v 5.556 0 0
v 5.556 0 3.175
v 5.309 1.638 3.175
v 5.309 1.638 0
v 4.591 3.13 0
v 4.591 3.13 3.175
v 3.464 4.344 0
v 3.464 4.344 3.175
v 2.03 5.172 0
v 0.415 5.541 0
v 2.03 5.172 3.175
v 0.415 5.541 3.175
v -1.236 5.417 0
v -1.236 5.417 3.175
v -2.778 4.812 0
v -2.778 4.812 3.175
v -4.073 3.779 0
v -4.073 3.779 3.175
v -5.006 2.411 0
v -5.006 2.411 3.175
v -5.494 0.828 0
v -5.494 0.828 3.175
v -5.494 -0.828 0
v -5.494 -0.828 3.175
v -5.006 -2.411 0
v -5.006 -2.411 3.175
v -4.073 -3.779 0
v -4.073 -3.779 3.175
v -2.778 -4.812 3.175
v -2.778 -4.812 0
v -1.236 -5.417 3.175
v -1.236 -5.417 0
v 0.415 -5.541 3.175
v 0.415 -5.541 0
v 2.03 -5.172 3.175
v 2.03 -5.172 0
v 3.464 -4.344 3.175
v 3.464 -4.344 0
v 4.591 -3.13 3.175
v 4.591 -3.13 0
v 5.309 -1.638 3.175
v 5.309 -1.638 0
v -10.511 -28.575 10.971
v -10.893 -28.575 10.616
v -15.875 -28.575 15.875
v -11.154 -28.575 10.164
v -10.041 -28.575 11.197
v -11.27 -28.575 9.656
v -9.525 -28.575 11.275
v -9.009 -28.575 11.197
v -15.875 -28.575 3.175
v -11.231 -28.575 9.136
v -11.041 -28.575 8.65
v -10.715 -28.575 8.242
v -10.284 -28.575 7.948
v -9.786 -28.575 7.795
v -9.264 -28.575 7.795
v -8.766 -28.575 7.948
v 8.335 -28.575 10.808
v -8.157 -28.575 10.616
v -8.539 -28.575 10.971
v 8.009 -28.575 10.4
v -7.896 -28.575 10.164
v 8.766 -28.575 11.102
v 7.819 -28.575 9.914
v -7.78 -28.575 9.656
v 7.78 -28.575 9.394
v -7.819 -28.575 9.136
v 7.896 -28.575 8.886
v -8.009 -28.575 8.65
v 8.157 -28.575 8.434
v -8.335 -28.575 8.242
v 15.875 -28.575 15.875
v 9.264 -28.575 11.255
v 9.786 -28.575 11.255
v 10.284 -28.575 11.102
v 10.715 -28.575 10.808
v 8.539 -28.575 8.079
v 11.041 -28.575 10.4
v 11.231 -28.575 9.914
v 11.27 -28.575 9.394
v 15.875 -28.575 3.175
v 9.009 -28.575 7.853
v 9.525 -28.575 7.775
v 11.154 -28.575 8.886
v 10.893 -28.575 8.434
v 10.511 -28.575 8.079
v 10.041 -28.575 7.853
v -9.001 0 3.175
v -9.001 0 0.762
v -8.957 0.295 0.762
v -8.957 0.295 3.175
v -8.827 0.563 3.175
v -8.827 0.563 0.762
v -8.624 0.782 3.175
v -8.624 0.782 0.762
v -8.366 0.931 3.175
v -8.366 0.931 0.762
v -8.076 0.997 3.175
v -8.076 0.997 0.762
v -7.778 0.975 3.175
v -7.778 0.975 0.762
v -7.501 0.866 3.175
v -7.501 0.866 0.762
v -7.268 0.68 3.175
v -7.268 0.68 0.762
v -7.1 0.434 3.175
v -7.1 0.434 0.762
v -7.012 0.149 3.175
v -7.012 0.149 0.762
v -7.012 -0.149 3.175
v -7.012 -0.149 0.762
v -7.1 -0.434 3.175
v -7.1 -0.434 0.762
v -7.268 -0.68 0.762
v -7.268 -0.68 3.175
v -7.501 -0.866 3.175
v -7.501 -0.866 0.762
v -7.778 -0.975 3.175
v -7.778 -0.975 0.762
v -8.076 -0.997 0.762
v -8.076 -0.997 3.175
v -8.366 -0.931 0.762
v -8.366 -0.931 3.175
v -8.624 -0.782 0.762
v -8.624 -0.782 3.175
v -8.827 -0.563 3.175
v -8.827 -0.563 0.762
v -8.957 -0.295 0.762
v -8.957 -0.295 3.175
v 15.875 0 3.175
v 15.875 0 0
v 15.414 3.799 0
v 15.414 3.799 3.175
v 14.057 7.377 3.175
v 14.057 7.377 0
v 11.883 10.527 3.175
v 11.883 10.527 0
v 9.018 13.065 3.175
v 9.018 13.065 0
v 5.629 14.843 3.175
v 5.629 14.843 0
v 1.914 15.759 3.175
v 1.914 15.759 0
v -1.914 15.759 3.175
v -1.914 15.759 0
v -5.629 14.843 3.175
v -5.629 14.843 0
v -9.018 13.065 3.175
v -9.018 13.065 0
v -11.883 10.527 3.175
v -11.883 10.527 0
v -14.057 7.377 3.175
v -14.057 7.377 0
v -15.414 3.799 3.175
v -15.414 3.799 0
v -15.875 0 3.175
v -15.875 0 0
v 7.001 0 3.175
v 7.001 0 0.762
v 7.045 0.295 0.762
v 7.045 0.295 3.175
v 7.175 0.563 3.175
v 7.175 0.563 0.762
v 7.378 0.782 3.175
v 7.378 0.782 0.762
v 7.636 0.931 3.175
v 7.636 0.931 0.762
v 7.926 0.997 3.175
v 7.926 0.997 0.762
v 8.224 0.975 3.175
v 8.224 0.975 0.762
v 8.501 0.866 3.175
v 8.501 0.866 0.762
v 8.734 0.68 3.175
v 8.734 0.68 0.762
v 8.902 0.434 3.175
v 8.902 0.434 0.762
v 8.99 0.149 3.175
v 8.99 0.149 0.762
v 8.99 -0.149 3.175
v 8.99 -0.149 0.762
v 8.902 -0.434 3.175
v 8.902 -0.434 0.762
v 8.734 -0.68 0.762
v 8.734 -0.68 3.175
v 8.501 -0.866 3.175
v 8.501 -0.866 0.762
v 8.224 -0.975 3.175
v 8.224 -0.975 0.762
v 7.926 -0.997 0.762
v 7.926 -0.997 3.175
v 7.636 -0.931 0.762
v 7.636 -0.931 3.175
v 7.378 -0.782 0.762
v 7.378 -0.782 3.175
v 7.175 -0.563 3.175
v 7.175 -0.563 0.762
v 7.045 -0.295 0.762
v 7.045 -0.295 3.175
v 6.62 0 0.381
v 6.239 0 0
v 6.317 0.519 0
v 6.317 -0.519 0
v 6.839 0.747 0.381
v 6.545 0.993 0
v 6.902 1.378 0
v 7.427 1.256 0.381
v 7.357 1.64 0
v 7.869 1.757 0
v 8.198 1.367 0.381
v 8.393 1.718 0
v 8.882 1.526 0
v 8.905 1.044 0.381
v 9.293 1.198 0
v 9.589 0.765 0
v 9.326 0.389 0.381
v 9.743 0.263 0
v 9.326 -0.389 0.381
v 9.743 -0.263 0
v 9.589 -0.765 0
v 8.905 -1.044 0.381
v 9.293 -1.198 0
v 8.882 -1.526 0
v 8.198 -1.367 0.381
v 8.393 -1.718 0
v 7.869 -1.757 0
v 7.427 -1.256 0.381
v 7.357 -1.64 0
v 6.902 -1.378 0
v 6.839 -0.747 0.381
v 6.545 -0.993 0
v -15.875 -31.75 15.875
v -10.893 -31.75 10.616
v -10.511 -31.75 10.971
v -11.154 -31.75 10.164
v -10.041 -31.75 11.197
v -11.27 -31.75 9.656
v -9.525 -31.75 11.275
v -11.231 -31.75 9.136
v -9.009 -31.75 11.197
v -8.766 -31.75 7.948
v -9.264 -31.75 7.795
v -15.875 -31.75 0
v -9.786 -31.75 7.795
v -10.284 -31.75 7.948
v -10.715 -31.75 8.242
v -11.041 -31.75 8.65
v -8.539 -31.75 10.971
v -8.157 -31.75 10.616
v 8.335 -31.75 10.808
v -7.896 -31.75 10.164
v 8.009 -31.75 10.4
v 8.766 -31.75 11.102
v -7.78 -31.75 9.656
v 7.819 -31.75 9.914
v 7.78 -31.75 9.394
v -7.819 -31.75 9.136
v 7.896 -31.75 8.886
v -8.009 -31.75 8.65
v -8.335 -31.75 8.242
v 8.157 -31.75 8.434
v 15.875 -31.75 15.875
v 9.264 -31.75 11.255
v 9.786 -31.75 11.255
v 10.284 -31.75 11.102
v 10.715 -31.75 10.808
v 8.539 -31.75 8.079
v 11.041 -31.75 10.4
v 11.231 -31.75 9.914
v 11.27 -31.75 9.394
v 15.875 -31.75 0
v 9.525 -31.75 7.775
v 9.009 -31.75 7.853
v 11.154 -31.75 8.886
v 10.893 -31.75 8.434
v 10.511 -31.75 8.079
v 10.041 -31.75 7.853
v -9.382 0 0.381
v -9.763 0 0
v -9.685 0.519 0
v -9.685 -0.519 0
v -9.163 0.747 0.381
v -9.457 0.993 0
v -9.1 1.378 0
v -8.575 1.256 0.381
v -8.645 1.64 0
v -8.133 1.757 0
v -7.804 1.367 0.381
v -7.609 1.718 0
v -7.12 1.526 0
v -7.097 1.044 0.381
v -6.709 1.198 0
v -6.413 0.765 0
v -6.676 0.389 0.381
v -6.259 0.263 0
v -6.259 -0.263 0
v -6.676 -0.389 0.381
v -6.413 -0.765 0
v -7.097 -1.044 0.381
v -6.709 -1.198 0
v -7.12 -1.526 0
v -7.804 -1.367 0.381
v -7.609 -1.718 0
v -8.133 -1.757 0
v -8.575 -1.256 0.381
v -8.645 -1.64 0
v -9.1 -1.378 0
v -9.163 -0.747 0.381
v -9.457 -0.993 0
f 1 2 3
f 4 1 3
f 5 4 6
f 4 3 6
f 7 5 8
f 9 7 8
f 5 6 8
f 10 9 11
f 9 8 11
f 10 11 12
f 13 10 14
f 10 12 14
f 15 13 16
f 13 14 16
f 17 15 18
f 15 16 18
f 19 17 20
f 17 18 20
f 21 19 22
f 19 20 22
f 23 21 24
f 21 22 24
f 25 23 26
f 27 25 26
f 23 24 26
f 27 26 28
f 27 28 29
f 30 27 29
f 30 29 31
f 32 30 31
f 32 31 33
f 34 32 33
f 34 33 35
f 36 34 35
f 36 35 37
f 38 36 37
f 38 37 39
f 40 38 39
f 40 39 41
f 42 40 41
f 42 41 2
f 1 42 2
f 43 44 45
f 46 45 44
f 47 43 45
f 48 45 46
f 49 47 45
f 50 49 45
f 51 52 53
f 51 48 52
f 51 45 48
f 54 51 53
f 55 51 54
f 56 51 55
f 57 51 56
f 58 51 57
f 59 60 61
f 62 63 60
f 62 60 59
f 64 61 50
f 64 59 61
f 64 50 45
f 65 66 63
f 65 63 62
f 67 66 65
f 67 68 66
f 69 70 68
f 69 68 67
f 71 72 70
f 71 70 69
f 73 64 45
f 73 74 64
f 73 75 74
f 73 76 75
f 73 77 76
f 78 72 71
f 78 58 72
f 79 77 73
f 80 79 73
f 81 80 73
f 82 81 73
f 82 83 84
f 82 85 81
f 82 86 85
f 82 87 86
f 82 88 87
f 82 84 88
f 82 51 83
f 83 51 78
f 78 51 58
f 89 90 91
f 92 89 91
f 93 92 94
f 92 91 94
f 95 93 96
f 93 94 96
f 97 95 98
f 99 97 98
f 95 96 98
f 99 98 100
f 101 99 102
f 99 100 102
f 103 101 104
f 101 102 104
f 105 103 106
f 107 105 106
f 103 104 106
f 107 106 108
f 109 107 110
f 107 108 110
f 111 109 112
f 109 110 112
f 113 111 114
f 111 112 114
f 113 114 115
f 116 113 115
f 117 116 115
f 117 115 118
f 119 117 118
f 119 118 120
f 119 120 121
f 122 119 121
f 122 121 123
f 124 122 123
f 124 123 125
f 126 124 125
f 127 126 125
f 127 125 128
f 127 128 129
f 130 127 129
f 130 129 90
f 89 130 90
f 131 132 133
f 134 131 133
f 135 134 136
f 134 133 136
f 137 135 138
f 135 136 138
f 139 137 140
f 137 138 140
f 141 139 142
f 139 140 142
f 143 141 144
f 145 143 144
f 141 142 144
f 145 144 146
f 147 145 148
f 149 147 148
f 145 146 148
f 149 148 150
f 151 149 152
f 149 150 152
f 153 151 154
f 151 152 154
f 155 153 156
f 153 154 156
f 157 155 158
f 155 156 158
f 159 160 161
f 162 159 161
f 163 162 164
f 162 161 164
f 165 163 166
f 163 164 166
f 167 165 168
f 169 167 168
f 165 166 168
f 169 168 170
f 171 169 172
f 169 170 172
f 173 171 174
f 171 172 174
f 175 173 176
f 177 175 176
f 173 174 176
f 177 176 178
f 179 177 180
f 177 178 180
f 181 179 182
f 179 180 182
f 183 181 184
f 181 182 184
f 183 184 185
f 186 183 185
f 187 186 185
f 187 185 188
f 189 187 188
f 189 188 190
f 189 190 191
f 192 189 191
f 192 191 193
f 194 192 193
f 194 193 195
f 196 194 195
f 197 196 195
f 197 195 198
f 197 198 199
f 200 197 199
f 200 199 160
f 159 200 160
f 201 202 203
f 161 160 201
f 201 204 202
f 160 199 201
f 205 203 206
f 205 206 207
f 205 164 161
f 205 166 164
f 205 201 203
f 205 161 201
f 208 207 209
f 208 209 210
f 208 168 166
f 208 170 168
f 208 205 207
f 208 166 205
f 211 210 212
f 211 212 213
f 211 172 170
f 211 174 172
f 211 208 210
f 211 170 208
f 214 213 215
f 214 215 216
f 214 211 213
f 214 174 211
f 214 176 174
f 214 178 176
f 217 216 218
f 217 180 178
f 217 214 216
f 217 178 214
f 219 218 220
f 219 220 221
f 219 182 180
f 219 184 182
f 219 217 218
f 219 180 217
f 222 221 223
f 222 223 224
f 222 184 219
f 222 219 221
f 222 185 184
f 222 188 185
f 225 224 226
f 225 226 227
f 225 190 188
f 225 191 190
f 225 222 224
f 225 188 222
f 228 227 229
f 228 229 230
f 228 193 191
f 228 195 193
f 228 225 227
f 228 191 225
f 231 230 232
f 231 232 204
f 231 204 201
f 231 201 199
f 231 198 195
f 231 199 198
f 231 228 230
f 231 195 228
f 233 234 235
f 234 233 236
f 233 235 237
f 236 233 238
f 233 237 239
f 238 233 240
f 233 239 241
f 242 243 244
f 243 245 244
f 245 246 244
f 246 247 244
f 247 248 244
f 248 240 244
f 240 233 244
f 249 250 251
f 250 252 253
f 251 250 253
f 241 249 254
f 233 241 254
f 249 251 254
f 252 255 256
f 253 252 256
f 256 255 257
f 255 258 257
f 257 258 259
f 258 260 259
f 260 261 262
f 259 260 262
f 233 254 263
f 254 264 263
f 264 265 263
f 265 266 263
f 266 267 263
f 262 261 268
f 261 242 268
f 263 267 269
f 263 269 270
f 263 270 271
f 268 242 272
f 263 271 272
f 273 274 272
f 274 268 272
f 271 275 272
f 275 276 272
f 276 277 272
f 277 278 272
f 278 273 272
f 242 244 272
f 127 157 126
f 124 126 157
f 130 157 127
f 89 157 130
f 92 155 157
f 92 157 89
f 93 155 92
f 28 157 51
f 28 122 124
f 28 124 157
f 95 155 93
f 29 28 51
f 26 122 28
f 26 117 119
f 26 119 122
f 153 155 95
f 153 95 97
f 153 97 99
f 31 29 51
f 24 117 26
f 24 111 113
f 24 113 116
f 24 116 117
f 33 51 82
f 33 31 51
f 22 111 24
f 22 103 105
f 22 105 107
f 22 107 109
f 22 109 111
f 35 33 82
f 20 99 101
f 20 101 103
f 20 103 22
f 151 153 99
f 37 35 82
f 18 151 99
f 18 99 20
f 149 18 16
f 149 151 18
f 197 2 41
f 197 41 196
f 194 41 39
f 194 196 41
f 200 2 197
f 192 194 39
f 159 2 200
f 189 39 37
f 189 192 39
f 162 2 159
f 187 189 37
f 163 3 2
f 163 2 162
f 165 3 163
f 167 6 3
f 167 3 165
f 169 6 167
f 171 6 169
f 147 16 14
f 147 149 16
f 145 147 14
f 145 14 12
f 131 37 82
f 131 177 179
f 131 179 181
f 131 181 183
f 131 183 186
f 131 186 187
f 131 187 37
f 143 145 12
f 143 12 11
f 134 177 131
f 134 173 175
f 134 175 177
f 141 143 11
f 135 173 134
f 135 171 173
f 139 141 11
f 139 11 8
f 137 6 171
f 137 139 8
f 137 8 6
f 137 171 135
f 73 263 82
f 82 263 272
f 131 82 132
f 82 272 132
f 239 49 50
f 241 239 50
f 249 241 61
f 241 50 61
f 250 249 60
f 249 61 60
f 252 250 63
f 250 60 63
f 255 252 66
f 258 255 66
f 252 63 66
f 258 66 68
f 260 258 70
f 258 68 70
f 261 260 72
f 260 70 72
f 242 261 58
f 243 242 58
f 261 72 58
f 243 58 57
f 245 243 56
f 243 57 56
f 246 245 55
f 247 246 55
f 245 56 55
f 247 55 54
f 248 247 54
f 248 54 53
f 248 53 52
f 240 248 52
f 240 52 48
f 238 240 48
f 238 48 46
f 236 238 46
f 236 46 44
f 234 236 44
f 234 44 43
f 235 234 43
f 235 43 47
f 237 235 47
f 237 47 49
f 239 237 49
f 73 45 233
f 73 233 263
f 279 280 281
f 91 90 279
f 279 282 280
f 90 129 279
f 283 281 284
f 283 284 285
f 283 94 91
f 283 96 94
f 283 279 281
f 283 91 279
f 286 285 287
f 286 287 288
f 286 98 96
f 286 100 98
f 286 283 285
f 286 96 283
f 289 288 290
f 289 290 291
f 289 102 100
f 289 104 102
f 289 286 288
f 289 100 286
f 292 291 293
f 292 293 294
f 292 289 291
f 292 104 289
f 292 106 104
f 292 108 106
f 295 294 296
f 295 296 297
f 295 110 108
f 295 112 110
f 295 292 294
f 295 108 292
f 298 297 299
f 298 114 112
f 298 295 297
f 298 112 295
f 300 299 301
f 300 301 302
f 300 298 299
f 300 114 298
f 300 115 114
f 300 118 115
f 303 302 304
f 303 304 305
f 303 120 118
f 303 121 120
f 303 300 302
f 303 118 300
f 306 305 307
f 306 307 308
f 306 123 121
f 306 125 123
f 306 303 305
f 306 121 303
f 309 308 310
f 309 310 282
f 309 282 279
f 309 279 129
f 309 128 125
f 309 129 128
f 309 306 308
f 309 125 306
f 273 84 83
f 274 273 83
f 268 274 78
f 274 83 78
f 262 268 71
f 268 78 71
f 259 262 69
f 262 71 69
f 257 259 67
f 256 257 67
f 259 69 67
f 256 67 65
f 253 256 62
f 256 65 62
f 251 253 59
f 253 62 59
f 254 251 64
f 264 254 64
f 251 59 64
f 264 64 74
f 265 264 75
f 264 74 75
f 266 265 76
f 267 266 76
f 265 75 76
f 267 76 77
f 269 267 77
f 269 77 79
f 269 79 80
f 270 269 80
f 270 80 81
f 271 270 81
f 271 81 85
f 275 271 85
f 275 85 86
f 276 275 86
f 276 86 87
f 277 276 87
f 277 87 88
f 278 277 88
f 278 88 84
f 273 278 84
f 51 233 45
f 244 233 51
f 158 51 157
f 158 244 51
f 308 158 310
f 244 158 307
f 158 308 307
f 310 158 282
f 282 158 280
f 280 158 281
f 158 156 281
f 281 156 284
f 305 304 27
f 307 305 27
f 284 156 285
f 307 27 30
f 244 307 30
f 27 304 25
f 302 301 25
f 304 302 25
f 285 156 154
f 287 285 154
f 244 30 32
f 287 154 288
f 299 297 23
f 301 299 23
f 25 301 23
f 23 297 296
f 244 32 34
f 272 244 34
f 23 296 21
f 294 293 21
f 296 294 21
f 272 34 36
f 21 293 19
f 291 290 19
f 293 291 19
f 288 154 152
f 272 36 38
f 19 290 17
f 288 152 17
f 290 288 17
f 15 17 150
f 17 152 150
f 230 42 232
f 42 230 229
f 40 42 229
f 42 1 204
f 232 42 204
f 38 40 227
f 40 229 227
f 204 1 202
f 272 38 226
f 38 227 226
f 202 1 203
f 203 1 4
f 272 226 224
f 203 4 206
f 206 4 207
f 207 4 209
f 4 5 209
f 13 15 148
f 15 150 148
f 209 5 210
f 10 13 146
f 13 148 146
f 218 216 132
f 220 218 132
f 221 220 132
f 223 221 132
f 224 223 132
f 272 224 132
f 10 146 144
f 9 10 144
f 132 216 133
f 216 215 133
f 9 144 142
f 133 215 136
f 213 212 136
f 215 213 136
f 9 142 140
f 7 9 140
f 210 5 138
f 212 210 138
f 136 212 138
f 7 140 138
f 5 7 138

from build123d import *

# Parameters (mm, degrees)
BOSS_EXTRUDE1_DEPTH       = 3.175
SKETCH3_R                 = 5.55625
CUT_EXTRUDE1_DEPTH        = 36.639286609
SKETCH4_W                 = 31.75
SKETCH4_H                 = 3.175
BOSS_EXTRUDE2_DEPTH       = 12.7
SKETCH5_R                 = 1.75
CUT_EXTRUDE2_DEPTH        = 50.797929174
F_2_0MM_DOWEL_HOLE1_D     = 2
F_2_0MM_DOWEL_HOLE1_DEPTH = 12.7
F_2_0MM_DOWEL_HOLE1_TIP   = 0.600860619
CHAMFER1_SIZE             = 0.762


with BuildPart() as part:
    # Sketch1 → Boss-Extrude1 (new body)
    with BuildSketch(Plane.XY):
        with BuildLine():
            ThreePointArc((15.875, 0), (0, 15.875), (-15.875, 0))
            Line((-15.875, 0), (15.875, 0))
        make_face()
        with BuildLine():
            ThreePointArc((15.875, 0), (0, -15.875), (-15.875, 0))
            Line((-15.875, 0), (-15.875, -31.75))
            Line((-15.875, -31.75), (15.875, -31.75))
            Line((15.875, -31.75), (15.875, 0))
        make_face()
        with BuildLine():
            Line((15.875, 0), (-15.875, 0))
            ThreePointArc((-15.875, 0), (0, -15.875), (15.875, 0))
        make_face()
    extrude(amount=BOSS_EXTRUDE1_DEPTH)

    # Sketch3 → Cut-Extrude1 (cut, through all)
    with BuildSketch(Plane.XY.offset(3.175)):
        Circle(SKETCH3_R)
    extrude(amount=-CUT_EXTRUDE1_DEPTH, mode=Mode.SUBTRACT)

    # Sketch4 → Boss-Extrude2 (add)
    with BuildSketch(Plane.XY.offset(3.175)):
        with Locations((0, -30.1625)):
            Rectangle(SKETCH4_W, SKETCH4_H)
    extrude(amount=BOSS_EXTRUDE2_DEPTH)

    # Sketch5 → Cut-Extrude2 (cut, through all)
    with BuildSketch(Plane(origin=(0, -28.575, 0), x_dir=(1, 0, 0), z_dir=(0, 1, 0))):
        with Locations(Location((-9.525, -9.525, 0), (0, 0, 270))):
            Circle(SKETCH5_R)
        with Locations(Location((9.525, -9.525, 0), (0, 0, 90))):
            Circle(SKETCH5_R)
    extrude(amount=-CUT_EXTRUDE2_DEPTH, mode=Mode.SUBTRACT)

    # Ø2.0mm Dowel Hole1
    with Locations(Plane.XY.offset(3.175)):
        with Locations((-8.001, 0), (8.001, 0)):
            Hole(F_2_0MM_DOWEL_HOLE1_D / 2, depth=F_2_0MM_DOWEL_HOLE1_DEPTH)
            with Locations((0, 0, -(F_2_0MM_DOWEL_HOLE1_DEPTH + F_2_0MM_DOWEL_HOLE1_TIP / 2))):  # 118° drill point
                Cone(0, F_2_0MM_DOWEL_HOLE1_D / 2, F_2_0MM_DOWEL_HOLE1_TIP, mode=Mode.SUBTRACT)

    # Chamfer1
    chamfer1_edges = [part.edges().sort_by_distance(p)[0] for p in [
        (9.001, 0, 0),
        (-7.001, 0, 0),
    ]]
    chamfer(chamfer1_edges, length=CHAMFER1_SIZE)


solid = part.part
